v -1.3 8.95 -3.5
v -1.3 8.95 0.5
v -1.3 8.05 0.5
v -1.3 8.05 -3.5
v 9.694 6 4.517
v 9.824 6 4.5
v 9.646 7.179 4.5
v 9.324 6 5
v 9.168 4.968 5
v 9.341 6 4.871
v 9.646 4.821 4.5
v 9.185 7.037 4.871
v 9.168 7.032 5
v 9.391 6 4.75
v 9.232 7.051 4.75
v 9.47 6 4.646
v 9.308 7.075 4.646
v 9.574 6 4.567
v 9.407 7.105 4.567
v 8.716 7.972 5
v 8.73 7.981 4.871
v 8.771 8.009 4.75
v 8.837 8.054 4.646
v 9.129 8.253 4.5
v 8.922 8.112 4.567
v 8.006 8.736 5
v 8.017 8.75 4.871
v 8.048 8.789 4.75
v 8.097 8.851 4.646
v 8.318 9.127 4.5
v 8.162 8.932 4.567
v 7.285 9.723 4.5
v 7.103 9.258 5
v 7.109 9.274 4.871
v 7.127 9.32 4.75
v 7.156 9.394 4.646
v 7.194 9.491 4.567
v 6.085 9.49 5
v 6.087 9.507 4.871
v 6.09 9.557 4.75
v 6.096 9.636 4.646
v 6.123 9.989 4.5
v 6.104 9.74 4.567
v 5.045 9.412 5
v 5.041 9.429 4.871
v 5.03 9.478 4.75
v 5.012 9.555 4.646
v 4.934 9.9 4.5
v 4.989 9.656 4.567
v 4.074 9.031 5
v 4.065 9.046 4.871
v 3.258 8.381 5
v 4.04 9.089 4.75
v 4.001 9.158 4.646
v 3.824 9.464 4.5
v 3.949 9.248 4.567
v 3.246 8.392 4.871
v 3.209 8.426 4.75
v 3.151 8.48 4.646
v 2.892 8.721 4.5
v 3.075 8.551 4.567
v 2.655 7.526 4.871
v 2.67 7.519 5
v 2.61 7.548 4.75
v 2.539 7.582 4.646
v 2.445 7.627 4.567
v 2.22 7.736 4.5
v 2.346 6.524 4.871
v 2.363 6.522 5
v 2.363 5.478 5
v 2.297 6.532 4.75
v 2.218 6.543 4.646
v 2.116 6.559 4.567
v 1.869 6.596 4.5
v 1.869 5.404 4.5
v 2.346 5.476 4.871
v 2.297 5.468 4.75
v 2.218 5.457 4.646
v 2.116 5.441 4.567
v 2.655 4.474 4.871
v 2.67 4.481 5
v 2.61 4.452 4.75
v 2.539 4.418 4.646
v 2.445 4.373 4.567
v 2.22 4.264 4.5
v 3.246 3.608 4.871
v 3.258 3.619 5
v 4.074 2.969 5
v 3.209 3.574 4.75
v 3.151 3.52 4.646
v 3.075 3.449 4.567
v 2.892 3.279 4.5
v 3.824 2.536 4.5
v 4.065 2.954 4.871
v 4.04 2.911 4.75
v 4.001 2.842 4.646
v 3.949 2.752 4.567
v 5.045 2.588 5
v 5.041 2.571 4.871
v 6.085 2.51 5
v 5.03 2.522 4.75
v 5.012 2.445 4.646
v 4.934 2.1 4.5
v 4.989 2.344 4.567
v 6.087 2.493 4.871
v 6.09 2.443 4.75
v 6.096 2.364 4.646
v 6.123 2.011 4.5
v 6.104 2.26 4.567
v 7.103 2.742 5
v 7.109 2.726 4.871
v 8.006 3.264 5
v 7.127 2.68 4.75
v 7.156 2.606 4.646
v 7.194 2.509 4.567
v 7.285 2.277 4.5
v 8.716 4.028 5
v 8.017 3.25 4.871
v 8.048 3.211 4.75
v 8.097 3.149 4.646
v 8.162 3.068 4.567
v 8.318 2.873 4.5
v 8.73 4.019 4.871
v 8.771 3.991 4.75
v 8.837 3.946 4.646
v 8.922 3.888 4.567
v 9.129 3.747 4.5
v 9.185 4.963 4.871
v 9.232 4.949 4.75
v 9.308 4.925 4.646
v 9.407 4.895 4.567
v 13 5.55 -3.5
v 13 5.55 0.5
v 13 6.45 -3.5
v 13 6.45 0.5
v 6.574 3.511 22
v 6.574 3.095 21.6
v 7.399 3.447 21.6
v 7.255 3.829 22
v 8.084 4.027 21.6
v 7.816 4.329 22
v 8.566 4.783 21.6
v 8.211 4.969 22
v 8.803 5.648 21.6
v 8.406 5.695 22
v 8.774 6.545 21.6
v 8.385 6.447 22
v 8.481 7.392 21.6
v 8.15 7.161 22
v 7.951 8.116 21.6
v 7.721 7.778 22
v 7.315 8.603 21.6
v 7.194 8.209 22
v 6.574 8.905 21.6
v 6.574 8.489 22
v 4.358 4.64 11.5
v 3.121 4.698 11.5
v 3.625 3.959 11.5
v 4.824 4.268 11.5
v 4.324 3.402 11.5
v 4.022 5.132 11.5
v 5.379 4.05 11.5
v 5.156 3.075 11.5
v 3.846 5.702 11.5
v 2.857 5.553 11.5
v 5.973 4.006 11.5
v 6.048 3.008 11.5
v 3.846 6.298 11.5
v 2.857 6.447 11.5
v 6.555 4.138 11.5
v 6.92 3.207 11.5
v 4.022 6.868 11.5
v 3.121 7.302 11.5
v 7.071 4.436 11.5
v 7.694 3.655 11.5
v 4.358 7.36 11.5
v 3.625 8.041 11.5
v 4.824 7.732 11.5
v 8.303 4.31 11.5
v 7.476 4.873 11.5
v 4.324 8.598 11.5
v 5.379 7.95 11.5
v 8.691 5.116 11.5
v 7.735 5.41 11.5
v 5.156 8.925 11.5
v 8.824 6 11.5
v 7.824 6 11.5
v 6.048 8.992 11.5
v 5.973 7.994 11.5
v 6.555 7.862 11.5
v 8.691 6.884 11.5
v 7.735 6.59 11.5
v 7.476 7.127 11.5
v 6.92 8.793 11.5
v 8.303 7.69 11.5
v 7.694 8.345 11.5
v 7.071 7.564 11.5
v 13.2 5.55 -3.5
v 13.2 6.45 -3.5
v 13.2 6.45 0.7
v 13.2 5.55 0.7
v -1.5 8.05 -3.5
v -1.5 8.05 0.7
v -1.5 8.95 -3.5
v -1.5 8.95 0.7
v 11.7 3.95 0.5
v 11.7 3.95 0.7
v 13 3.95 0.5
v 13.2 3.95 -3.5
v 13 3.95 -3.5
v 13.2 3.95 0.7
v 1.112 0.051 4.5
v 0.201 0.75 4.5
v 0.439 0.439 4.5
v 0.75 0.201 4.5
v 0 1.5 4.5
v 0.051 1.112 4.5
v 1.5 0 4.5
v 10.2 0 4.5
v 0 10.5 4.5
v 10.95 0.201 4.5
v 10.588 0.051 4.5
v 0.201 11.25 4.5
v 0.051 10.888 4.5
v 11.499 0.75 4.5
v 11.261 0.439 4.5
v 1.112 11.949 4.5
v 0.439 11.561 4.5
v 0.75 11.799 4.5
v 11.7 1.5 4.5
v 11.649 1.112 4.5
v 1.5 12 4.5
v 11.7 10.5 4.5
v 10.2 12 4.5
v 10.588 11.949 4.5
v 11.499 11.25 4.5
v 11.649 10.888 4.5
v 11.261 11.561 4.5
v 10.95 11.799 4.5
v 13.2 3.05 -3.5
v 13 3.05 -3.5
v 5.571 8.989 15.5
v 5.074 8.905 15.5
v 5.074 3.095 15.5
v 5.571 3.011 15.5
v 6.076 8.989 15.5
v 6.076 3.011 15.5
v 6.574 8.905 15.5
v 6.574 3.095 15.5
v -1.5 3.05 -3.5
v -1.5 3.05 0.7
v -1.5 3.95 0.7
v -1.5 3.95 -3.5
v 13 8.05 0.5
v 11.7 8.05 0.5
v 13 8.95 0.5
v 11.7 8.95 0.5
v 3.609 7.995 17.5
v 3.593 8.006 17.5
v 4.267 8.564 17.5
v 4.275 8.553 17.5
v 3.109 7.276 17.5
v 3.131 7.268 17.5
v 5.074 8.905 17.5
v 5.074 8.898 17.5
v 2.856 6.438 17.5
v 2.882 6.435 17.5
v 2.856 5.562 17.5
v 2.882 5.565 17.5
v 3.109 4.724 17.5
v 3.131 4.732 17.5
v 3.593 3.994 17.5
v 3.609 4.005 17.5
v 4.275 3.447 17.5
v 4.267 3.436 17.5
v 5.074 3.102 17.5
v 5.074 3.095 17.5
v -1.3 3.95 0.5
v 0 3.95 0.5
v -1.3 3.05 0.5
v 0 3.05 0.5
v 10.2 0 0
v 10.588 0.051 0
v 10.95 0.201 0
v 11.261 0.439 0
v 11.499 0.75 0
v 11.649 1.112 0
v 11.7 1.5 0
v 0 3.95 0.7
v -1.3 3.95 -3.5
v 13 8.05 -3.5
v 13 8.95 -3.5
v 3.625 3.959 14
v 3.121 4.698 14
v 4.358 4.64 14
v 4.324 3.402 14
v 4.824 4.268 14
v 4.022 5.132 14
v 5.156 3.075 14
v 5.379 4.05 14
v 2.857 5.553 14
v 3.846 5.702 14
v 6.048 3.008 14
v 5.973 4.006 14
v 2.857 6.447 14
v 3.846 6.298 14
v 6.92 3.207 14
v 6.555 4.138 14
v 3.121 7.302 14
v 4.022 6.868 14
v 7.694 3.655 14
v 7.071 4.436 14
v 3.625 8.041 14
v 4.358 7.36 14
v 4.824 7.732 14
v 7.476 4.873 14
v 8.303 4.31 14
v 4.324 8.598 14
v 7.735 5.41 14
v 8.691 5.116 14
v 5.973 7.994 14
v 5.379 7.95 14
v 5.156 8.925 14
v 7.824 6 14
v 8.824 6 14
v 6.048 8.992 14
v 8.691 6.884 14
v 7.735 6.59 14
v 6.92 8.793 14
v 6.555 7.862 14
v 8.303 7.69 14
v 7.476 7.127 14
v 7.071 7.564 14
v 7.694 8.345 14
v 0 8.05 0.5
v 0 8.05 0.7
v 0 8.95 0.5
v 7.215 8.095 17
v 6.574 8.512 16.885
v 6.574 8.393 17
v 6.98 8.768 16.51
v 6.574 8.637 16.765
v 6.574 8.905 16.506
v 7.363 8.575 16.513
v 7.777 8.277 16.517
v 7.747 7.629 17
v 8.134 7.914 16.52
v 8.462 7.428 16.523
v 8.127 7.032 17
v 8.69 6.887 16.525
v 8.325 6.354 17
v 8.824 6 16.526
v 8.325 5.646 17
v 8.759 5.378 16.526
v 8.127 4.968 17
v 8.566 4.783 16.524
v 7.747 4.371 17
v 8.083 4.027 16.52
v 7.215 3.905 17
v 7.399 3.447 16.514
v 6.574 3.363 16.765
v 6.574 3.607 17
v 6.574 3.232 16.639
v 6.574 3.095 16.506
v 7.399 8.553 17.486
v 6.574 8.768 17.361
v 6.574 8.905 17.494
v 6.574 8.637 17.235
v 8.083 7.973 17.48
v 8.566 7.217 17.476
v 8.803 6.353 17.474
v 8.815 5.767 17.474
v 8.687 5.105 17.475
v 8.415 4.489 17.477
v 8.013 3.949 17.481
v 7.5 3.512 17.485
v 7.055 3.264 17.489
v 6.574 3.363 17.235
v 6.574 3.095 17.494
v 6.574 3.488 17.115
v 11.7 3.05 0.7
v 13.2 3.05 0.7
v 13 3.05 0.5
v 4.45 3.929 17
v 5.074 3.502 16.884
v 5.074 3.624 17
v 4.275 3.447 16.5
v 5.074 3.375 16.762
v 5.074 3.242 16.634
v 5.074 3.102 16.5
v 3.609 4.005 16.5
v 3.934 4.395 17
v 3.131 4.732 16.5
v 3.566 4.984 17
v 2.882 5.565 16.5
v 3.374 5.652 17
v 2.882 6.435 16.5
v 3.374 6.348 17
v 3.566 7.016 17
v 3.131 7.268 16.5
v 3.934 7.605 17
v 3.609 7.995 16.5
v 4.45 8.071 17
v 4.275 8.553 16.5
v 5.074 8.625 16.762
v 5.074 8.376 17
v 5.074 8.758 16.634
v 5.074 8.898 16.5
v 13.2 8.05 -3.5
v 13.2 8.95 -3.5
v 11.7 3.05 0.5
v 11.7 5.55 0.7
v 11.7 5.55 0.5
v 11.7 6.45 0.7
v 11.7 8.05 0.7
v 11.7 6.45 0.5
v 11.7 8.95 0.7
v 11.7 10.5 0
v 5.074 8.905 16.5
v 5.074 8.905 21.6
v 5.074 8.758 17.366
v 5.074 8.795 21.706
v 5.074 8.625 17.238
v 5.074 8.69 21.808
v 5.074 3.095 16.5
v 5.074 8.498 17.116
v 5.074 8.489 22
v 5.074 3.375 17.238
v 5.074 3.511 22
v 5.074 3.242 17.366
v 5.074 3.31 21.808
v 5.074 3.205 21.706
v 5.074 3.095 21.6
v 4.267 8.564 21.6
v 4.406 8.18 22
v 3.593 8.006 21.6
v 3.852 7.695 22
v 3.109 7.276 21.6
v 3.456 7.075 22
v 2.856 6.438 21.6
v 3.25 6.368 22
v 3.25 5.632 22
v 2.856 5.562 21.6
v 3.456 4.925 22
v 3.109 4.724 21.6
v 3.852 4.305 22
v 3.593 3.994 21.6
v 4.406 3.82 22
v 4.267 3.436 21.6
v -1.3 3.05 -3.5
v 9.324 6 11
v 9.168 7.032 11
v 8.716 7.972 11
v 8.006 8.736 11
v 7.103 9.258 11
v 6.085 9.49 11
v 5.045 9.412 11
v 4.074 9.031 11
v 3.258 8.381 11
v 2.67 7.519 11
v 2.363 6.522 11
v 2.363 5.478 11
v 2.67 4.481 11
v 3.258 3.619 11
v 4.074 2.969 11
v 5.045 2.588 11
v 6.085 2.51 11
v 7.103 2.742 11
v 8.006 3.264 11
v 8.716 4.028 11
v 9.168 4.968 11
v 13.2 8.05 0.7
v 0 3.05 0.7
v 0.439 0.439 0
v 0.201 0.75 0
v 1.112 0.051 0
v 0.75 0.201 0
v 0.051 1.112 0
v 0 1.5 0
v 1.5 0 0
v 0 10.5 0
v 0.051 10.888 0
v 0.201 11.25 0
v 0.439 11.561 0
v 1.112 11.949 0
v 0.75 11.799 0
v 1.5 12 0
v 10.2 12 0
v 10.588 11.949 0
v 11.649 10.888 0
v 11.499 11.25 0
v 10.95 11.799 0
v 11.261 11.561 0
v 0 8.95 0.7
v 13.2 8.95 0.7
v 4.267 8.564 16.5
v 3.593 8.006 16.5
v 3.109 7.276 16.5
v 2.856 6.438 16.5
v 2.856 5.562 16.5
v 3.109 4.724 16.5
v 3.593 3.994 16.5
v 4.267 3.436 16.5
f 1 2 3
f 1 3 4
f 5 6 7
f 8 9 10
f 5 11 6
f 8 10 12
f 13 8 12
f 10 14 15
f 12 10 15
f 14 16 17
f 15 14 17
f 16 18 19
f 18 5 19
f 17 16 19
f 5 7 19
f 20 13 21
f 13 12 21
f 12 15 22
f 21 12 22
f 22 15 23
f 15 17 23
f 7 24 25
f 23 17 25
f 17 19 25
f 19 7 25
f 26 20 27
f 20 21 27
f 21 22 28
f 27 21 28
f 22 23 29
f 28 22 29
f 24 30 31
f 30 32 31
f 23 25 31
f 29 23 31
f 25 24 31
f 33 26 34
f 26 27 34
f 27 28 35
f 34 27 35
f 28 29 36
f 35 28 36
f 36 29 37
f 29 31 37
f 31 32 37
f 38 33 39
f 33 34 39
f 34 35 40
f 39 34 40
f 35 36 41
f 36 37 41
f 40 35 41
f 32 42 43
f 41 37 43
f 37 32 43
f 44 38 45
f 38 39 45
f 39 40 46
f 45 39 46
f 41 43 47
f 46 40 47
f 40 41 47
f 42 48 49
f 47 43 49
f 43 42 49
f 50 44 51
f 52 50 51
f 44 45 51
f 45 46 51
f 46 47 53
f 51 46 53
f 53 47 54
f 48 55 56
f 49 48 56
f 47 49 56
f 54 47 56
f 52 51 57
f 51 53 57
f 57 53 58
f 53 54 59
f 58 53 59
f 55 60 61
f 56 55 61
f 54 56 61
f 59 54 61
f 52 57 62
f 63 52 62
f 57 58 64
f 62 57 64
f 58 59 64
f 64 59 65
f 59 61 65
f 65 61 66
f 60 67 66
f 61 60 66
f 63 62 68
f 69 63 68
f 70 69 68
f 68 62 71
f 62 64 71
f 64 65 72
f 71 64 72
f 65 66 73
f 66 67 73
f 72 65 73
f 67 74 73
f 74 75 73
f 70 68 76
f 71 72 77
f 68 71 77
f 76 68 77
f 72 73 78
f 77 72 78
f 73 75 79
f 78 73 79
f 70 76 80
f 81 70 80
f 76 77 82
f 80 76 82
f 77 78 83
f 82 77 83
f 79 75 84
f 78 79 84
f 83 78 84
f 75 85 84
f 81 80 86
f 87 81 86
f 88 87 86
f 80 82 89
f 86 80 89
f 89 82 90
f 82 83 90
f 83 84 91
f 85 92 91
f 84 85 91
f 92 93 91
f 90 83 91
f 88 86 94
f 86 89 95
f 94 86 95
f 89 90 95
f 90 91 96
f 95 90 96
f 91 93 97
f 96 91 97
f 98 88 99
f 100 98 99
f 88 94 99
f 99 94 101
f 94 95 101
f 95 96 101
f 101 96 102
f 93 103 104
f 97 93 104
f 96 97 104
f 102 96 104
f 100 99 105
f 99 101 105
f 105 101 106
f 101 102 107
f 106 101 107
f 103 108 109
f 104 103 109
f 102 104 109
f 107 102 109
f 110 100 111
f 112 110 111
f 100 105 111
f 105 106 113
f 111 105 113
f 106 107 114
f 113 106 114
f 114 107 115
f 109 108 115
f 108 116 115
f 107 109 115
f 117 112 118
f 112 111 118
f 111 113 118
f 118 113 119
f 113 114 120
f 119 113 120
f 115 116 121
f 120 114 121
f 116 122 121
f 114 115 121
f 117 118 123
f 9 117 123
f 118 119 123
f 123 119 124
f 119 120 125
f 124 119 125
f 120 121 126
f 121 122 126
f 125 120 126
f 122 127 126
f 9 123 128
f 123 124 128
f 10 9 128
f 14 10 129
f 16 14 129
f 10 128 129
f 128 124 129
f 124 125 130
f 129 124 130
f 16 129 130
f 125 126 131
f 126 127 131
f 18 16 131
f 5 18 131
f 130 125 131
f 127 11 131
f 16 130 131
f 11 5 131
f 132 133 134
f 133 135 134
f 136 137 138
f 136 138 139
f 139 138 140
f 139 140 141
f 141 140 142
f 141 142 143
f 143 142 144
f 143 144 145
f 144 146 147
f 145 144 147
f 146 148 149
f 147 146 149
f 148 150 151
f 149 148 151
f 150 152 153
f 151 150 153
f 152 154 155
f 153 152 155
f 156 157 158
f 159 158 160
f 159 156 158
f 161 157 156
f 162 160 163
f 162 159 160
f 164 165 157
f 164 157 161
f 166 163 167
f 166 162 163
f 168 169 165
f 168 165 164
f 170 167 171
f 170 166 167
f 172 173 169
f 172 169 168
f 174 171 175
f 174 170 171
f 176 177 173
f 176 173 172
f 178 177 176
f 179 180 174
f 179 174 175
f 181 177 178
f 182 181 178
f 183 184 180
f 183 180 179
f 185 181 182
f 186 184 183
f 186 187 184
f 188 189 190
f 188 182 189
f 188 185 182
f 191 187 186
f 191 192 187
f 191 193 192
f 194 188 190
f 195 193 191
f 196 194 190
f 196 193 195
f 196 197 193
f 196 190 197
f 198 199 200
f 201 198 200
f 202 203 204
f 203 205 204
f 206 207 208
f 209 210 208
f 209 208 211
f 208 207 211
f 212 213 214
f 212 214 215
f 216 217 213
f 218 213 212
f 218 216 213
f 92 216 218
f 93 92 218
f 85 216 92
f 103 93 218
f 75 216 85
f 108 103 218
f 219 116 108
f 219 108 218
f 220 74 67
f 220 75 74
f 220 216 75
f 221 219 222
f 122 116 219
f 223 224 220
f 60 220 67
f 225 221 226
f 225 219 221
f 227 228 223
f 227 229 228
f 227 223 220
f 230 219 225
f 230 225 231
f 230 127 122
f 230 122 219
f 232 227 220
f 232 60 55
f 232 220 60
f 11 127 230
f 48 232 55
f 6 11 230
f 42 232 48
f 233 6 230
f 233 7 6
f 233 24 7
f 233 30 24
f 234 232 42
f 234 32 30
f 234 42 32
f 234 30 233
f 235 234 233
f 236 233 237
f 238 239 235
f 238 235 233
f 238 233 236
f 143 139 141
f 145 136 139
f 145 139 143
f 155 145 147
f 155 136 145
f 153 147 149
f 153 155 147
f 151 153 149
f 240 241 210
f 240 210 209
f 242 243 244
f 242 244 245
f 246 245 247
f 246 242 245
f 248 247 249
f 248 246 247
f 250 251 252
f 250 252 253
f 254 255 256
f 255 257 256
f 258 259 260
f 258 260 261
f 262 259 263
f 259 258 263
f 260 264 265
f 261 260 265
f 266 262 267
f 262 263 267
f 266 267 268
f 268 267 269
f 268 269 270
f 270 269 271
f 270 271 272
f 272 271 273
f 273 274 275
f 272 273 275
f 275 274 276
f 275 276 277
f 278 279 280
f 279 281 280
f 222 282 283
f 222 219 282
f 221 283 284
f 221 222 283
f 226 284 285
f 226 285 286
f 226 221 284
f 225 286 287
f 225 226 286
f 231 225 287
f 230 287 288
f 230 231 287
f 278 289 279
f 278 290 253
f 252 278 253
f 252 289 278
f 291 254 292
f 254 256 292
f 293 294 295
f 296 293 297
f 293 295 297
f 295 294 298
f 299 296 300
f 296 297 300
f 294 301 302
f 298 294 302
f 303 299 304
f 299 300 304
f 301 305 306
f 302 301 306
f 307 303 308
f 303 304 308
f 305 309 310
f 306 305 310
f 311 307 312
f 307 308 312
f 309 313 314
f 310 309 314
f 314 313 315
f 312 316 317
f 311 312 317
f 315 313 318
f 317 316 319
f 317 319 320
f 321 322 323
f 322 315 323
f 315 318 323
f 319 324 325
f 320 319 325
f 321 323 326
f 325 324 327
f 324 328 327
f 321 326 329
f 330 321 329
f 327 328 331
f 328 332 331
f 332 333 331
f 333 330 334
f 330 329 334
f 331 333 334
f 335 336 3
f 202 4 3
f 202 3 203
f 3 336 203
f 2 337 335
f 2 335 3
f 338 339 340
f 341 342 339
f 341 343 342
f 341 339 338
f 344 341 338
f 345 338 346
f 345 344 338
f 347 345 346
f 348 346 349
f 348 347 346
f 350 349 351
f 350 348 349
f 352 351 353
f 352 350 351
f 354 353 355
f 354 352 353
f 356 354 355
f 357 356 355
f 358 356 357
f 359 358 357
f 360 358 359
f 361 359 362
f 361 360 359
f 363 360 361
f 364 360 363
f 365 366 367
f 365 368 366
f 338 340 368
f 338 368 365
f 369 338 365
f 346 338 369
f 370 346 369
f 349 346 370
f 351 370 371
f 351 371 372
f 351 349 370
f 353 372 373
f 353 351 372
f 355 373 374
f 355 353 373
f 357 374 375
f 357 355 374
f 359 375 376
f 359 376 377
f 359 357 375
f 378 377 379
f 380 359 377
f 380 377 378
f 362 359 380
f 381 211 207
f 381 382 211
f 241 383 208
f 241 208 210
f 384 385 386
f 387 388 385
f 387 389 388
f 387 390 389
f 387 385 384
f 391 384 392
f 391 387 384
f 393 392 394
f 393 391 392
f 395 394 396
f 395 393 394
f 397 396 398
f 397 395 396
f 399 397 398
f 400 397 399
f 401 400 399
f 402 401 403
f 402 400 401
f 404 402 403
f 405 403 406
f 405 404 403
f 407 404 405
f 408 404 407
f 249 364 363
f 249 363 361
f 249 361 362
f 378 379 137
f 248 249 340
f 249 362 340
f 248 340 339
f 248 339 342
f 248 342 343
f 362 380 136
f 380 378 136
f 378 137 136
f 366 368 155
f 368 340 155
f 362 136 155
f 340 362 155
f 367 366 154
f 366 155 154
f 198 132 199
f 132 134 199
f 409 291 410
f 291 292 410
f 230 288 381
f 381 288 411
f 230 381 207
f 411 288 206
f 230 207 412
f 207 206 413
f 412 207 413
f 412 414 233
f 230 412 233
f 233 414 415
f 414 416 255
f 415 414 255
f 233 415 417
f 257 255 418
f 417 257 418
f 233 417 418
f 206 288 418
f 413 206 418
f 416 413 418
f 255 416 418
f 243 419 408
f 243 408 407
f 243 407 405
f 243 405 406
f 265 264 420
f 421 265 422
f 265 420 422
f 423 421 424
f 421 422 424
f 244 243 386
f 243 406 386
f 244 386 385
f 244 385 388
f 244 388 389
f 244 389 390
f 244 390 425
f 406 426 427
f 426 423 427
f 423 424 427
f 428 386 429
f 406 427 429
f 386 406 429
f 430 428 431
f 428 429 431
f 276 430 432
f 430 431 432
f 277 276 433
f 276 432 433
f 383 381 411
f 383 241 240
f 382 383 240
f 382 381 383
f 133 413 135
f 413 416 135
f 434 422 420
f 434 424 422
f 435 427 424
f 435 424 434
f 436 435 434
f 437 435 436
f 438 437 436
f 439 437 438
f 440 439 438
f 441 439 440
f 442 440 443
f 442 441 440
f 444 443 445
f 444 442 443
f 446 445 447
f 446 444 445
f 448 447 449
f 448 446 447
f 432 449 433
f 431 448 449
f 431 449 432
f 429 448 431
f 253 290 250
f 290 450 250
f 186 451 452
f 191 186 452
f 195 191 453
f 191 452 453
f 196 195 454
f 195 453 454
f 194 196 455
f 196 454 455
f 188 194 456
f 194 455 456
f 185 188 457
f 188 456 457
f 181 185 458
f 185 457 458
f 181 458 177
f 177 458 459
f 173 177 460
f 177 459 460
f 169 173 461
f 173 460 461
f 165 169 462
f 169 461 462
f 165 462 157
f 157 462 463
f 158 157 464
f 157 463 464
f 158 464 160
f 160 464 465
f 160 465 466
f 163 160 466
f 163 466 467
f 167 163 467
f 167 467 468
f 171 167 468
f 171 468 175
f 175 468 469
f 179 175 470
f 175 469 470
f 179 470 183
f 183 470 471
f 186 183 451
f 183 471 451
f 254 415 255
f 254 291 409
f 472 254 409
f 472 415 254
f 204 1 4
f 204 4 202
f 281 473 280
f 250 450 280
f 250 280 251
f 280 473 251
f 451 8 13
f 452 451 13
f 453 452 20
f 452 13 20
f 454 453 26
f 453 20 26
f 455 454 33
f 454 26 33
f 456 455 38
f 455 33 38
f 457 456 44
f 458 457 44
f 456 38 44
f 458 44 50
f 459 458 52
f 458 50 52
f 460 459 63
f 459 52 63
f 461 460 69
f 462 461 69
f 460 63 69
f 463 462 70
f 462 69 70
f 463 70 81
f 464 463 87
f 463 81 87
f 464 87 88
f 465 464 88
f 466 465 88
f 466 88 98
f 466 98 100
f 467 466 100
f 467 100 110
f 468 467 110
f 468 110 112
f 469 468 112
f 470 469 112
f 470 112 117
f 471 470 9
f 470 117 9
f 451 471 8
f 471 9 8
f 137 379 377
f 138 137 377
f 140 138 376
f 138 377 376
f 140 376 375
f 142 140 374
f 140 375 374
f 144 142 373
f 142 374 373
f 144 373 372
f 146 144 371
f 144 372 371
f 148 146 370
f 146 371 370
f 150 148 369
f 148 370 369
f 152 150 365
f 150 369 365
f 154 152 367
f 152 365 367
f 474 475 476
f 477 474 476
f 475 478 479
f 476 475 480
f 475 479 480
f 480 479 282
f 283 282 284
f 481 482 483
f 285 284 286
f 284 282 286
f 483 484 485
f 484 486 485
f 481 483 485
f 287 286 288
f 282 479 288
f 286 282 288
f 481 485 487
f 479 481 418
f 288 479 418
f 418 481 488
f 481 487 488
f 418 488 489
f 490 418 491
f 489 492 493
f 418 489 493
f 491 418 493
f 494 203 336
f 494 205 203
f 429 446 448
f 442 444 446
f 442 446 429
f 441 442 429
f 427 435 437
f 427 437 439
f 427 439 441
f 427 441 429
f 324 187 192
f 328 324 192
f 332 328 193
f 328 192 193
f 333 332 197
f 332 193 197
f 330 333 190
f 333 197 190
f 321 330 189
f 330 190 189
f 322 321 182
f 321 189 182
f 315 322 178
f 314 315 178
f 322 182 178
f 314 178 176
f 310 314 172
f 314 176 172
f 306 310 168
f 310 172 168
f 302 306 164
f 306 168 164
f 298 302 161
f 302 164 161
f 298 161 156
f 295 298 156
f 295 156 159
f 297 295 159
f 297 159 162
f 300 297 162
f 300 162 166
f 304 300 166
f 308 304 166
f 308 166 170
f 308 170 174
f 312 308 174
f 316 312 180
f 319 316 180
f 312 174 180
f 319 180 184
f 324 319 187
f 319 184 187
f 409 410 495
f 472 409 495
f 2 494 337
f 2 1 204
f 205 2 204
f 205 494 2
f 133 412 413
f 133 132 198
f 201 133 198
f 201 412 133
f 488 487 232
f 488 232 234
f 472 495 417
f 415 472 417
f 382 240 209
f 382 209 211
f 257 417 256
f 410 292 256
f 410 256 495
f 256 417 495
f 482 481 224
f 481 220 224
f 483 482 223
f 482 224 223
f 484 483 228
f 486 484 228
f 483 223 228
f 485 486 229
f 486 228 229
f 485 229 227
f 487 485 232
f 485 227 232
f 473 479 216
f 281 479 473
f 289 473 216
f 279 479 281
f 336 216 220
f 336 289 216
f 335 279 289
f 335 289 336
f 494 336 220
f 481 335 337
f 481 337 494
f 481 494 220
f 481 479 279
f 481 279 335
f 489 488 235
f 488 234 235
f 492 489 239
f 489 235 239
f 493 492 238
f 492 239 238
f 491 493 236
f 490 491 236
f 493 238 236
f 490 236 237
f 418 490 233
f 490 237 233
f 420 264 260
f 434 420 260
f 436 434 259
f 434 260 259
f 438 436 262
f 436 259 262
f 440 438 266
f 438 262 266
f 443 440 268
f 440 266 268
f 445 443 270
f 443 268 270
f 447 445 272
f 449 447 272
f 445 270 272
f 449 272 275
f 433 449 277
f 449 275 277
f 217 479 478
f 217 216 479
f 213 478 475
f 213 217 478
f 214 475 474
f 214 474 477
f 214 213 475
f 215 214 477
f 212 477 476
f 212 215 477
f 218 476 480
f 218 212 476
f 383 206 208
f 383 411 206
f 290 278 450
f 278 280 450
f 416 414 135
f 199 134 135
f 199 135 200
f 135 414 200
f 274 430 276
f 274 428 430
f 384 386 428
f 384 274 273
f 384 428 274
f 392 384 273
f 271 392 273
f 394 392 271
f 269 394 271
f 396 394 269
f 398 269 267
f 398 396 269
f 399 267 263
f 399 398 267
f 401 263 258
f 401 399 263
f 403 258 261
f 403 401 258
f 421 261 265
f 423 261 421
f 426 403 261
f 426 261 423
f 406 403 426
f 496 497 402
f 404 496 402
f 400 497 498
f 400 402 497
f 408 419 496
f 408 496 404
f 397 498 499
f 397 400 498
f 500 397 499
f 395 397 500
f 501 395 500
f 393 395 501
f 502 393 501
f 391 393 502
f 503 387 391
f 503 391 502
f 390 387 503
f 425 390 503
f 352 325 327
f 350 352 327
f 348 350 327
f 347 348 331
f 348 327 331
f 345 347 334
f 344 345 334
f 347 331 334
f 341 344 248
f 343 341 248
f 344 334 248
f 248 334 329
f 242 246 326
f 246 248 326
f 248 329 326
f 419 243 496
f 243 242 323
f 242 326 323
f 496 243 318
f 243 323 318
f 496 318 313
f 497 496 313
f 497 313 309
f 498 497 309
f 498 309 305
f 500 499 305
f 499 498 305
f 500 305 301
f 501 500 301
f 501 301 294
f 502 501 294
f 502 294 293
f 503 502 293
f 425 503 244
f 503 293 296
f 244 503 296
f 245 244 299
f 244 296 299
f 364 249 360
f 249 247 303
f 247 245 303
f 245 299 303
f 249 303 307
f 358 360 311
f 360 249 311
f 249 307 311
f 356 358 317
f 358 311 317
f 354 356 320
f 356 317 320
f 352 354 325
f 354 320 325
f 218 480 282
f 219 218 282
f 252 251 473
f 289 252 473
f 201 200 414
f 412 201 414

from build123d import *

# Parameters (mm, degrees)
SKETCH_W             = 11.7
SKETCH_H             = 12
PAD_DEPTH            = 4.5
SKETCH001_R          = 3.5
PAD001_DEPTH         = 7
SKETCH002_R          = 2
PAD002_DEPTH         = 2.5
SKETCH004_R          = 3
PAD003_DEPTH         = 8
SKETCH005_W          = 1
SKETCH005_H          = 0.202996
POCKET_DEPTH         = 6.5
CHAMFER_SIZE         = 0.4
CHAMFER001_SIZE      = 0.5
FILLET_R             = 0.5
FILLET001_R          = 1.5
PAD004_DEPTH         = 0.45
PAD004_DEPTH_BACK    = 0.45
LINEARPATTERN_COUNT  = 3
LINEARPATTERN_PITCH  = 2.5
POCKET001_DEPTH      = 1
POCKET001_DEPTH_BACK = 1


with BuildPart() as part:
    # Sketch → Pad (new body)
    with BuildSketch(Plane.XY):
        with Locations((5.85, 6)):
            Rectangle(SKETCH_W, SKETCH_H)
    extrude(amount=PAD_DEPTH)

    # Sketch001 (on Face6 of Pad) → Pad001 (join)
    with BuildSketch(Plane.XY.offset(4.5)):
        with Locations((5.823836, 6)):
            Circle(SKETCH001_R)
    extrude(amount=PAD001_DEPTH)

    # Sketch002 (on Face8 of Pad001) → Pad002 (join)
    with BuildSketch(Plane.XY.offset(11.5)):
        with Locations((5.823836, 6)):
            Circle(SKETCH002_R)
    extrude(amount=PAD002_DEPTH)

    # Sketch004 (on Face10 of Pad002) → Pad003 (join)
    with BuildSketch(Plane.XY.offset(14)):
        with Locations((5.823836, 6)):
            Circle(SKETCH004_R)
    extrude(amount=PAD003_DEPTH)

    # Sketch005 (on DatumPlane) → Groove (revolve, cut)
    with BuildSketch(Plane(origin=(5.85, 6, 2.25), x_dir=(0, 0, -1), z_dir=(1, 0, 0))):
        Polygon((-15.25, 3), (-14.75, 2.5), (-14.25, 3), align=None)
        with Locations((-14.75, 3.101498)):
            Rectangle(SKETCH005_W, SKETCH005_H)
    revolve(axis=Axis((5.85, 6, 2.25), (0, 0, -1)), mode=Mode.SUBTRACT)

    # Sketch006 (on Face17 of Groove) → Pocket (cut)
    with BuildSketch(Plane.XY.offset(22)):
        with BuildLine():
            Line((5.073836, 8.904738), (5.073836, 3.095262))
            ThreePointArc((5.073836, 3.095262), (5.823836, 3), (6.573836, 3.095262))
            Line((6.573836, 3.095262), (6.573836, 8.904738))
            ThreePointArc((6.573836, 8.904738), (5.823836, 9), (5.073836, 8.904738))
        make_face()
    extrude(amount=-POCKET_DEPTH, mode=Mode.SUBTRACT)

    # Chamfer
    chamfer_edges = [part.edges().sort_by_distance(p)[0] for p in [
        (8.195544, 7.837117, 22),
        (8.195544, 4.162883, 22),
        (2.823836, 6, 22),
    ]]
    chamfer(chamfer_edges, length=CHAMFER_SIZE)

    # Chamfer001
    chamfer001_edges = [part.edges().sort_by_distance(p)[0] for p in [
        (2.323836, 6, 11.5),
    ]]
    chamfer(chamfer001_edges, length=CHAMFER001_SIZE)

    # Fillet
    fillet_edges = [part.edges().sort_by_distance(p)[0] for p in [
        (2.323836, 6, 4.5),
    ]]
    fillet(fillet_edges, radius=FILLET_R)

    # Fillet001
    fillet001_edges = [part.edges().sort_by_distance(p)[0] for p in [
        (11.7, 0, 2.25),
        (11.7, 12, 2.25),
        (0, 12, 2.25),
        (0, 0, 2.25),
    ]]
    fillet(fillet001_edges, radius=FILLET001_R)

    # Sketch007 (on DatumPlane) → Pad004 (join, two sides)
    with BuildSketch(Plane(origin=(5.85, 3.5, 2.25), x_dir=(1, 0, 0), z_dir=(0, -1, 0))) as pad004_sk:
        Polygon((5.85, -1.55), (5.85, -1.75), (7.15, -1.75), (7.15, -5.75), (7.35, -5.75), (7.35, -1.75), (7.35, -1.55), align=None)
        Polygon((-5.85, -1.55), (-5.85, -1.75), (-7.15, -1.75), (-7.15, -5.75), (-7.35, -5.75), (-7.35, -1.75), (-7.35, -1.55), align=None)
    pad004 = extrude(amount=PAD004_DEPTH) + extrude(pad004_sk.sketch, amount=-PAD004_DEPTH_BACK)

    # LinearPattern: Pad004 ×3
    with Locations(*[(0, i * LINEARPATTERN_PITCH, 0) for i in range(1, LINEARPATTERN_COUNT)]):
        add(pad004)

    # Sketch008 (on DatumPlane) → Pocket001 (cut, two sides)
    with BuildSketch(Plane(origin=(5.85, 6, 2.25), x_dir=(0, 0, -1), z_dir=(0, -1, 0))) as pocket001_sk:
        Polygon((1.55, -7.35), (1.55, -5.85), (1.75, -5.85), (1.75, -7.15), (5.75, -7.15), (5.75, -7.35), align=None)
    extrude(amount=-POCKET001_DEPTH, mode=Mode.SUBTRACT)
    extrude(pocket001_sk.sketch, amount=POCKET001_DEPTH_BACK, mode=Mode.SUBTRACT)


solid = part.part
